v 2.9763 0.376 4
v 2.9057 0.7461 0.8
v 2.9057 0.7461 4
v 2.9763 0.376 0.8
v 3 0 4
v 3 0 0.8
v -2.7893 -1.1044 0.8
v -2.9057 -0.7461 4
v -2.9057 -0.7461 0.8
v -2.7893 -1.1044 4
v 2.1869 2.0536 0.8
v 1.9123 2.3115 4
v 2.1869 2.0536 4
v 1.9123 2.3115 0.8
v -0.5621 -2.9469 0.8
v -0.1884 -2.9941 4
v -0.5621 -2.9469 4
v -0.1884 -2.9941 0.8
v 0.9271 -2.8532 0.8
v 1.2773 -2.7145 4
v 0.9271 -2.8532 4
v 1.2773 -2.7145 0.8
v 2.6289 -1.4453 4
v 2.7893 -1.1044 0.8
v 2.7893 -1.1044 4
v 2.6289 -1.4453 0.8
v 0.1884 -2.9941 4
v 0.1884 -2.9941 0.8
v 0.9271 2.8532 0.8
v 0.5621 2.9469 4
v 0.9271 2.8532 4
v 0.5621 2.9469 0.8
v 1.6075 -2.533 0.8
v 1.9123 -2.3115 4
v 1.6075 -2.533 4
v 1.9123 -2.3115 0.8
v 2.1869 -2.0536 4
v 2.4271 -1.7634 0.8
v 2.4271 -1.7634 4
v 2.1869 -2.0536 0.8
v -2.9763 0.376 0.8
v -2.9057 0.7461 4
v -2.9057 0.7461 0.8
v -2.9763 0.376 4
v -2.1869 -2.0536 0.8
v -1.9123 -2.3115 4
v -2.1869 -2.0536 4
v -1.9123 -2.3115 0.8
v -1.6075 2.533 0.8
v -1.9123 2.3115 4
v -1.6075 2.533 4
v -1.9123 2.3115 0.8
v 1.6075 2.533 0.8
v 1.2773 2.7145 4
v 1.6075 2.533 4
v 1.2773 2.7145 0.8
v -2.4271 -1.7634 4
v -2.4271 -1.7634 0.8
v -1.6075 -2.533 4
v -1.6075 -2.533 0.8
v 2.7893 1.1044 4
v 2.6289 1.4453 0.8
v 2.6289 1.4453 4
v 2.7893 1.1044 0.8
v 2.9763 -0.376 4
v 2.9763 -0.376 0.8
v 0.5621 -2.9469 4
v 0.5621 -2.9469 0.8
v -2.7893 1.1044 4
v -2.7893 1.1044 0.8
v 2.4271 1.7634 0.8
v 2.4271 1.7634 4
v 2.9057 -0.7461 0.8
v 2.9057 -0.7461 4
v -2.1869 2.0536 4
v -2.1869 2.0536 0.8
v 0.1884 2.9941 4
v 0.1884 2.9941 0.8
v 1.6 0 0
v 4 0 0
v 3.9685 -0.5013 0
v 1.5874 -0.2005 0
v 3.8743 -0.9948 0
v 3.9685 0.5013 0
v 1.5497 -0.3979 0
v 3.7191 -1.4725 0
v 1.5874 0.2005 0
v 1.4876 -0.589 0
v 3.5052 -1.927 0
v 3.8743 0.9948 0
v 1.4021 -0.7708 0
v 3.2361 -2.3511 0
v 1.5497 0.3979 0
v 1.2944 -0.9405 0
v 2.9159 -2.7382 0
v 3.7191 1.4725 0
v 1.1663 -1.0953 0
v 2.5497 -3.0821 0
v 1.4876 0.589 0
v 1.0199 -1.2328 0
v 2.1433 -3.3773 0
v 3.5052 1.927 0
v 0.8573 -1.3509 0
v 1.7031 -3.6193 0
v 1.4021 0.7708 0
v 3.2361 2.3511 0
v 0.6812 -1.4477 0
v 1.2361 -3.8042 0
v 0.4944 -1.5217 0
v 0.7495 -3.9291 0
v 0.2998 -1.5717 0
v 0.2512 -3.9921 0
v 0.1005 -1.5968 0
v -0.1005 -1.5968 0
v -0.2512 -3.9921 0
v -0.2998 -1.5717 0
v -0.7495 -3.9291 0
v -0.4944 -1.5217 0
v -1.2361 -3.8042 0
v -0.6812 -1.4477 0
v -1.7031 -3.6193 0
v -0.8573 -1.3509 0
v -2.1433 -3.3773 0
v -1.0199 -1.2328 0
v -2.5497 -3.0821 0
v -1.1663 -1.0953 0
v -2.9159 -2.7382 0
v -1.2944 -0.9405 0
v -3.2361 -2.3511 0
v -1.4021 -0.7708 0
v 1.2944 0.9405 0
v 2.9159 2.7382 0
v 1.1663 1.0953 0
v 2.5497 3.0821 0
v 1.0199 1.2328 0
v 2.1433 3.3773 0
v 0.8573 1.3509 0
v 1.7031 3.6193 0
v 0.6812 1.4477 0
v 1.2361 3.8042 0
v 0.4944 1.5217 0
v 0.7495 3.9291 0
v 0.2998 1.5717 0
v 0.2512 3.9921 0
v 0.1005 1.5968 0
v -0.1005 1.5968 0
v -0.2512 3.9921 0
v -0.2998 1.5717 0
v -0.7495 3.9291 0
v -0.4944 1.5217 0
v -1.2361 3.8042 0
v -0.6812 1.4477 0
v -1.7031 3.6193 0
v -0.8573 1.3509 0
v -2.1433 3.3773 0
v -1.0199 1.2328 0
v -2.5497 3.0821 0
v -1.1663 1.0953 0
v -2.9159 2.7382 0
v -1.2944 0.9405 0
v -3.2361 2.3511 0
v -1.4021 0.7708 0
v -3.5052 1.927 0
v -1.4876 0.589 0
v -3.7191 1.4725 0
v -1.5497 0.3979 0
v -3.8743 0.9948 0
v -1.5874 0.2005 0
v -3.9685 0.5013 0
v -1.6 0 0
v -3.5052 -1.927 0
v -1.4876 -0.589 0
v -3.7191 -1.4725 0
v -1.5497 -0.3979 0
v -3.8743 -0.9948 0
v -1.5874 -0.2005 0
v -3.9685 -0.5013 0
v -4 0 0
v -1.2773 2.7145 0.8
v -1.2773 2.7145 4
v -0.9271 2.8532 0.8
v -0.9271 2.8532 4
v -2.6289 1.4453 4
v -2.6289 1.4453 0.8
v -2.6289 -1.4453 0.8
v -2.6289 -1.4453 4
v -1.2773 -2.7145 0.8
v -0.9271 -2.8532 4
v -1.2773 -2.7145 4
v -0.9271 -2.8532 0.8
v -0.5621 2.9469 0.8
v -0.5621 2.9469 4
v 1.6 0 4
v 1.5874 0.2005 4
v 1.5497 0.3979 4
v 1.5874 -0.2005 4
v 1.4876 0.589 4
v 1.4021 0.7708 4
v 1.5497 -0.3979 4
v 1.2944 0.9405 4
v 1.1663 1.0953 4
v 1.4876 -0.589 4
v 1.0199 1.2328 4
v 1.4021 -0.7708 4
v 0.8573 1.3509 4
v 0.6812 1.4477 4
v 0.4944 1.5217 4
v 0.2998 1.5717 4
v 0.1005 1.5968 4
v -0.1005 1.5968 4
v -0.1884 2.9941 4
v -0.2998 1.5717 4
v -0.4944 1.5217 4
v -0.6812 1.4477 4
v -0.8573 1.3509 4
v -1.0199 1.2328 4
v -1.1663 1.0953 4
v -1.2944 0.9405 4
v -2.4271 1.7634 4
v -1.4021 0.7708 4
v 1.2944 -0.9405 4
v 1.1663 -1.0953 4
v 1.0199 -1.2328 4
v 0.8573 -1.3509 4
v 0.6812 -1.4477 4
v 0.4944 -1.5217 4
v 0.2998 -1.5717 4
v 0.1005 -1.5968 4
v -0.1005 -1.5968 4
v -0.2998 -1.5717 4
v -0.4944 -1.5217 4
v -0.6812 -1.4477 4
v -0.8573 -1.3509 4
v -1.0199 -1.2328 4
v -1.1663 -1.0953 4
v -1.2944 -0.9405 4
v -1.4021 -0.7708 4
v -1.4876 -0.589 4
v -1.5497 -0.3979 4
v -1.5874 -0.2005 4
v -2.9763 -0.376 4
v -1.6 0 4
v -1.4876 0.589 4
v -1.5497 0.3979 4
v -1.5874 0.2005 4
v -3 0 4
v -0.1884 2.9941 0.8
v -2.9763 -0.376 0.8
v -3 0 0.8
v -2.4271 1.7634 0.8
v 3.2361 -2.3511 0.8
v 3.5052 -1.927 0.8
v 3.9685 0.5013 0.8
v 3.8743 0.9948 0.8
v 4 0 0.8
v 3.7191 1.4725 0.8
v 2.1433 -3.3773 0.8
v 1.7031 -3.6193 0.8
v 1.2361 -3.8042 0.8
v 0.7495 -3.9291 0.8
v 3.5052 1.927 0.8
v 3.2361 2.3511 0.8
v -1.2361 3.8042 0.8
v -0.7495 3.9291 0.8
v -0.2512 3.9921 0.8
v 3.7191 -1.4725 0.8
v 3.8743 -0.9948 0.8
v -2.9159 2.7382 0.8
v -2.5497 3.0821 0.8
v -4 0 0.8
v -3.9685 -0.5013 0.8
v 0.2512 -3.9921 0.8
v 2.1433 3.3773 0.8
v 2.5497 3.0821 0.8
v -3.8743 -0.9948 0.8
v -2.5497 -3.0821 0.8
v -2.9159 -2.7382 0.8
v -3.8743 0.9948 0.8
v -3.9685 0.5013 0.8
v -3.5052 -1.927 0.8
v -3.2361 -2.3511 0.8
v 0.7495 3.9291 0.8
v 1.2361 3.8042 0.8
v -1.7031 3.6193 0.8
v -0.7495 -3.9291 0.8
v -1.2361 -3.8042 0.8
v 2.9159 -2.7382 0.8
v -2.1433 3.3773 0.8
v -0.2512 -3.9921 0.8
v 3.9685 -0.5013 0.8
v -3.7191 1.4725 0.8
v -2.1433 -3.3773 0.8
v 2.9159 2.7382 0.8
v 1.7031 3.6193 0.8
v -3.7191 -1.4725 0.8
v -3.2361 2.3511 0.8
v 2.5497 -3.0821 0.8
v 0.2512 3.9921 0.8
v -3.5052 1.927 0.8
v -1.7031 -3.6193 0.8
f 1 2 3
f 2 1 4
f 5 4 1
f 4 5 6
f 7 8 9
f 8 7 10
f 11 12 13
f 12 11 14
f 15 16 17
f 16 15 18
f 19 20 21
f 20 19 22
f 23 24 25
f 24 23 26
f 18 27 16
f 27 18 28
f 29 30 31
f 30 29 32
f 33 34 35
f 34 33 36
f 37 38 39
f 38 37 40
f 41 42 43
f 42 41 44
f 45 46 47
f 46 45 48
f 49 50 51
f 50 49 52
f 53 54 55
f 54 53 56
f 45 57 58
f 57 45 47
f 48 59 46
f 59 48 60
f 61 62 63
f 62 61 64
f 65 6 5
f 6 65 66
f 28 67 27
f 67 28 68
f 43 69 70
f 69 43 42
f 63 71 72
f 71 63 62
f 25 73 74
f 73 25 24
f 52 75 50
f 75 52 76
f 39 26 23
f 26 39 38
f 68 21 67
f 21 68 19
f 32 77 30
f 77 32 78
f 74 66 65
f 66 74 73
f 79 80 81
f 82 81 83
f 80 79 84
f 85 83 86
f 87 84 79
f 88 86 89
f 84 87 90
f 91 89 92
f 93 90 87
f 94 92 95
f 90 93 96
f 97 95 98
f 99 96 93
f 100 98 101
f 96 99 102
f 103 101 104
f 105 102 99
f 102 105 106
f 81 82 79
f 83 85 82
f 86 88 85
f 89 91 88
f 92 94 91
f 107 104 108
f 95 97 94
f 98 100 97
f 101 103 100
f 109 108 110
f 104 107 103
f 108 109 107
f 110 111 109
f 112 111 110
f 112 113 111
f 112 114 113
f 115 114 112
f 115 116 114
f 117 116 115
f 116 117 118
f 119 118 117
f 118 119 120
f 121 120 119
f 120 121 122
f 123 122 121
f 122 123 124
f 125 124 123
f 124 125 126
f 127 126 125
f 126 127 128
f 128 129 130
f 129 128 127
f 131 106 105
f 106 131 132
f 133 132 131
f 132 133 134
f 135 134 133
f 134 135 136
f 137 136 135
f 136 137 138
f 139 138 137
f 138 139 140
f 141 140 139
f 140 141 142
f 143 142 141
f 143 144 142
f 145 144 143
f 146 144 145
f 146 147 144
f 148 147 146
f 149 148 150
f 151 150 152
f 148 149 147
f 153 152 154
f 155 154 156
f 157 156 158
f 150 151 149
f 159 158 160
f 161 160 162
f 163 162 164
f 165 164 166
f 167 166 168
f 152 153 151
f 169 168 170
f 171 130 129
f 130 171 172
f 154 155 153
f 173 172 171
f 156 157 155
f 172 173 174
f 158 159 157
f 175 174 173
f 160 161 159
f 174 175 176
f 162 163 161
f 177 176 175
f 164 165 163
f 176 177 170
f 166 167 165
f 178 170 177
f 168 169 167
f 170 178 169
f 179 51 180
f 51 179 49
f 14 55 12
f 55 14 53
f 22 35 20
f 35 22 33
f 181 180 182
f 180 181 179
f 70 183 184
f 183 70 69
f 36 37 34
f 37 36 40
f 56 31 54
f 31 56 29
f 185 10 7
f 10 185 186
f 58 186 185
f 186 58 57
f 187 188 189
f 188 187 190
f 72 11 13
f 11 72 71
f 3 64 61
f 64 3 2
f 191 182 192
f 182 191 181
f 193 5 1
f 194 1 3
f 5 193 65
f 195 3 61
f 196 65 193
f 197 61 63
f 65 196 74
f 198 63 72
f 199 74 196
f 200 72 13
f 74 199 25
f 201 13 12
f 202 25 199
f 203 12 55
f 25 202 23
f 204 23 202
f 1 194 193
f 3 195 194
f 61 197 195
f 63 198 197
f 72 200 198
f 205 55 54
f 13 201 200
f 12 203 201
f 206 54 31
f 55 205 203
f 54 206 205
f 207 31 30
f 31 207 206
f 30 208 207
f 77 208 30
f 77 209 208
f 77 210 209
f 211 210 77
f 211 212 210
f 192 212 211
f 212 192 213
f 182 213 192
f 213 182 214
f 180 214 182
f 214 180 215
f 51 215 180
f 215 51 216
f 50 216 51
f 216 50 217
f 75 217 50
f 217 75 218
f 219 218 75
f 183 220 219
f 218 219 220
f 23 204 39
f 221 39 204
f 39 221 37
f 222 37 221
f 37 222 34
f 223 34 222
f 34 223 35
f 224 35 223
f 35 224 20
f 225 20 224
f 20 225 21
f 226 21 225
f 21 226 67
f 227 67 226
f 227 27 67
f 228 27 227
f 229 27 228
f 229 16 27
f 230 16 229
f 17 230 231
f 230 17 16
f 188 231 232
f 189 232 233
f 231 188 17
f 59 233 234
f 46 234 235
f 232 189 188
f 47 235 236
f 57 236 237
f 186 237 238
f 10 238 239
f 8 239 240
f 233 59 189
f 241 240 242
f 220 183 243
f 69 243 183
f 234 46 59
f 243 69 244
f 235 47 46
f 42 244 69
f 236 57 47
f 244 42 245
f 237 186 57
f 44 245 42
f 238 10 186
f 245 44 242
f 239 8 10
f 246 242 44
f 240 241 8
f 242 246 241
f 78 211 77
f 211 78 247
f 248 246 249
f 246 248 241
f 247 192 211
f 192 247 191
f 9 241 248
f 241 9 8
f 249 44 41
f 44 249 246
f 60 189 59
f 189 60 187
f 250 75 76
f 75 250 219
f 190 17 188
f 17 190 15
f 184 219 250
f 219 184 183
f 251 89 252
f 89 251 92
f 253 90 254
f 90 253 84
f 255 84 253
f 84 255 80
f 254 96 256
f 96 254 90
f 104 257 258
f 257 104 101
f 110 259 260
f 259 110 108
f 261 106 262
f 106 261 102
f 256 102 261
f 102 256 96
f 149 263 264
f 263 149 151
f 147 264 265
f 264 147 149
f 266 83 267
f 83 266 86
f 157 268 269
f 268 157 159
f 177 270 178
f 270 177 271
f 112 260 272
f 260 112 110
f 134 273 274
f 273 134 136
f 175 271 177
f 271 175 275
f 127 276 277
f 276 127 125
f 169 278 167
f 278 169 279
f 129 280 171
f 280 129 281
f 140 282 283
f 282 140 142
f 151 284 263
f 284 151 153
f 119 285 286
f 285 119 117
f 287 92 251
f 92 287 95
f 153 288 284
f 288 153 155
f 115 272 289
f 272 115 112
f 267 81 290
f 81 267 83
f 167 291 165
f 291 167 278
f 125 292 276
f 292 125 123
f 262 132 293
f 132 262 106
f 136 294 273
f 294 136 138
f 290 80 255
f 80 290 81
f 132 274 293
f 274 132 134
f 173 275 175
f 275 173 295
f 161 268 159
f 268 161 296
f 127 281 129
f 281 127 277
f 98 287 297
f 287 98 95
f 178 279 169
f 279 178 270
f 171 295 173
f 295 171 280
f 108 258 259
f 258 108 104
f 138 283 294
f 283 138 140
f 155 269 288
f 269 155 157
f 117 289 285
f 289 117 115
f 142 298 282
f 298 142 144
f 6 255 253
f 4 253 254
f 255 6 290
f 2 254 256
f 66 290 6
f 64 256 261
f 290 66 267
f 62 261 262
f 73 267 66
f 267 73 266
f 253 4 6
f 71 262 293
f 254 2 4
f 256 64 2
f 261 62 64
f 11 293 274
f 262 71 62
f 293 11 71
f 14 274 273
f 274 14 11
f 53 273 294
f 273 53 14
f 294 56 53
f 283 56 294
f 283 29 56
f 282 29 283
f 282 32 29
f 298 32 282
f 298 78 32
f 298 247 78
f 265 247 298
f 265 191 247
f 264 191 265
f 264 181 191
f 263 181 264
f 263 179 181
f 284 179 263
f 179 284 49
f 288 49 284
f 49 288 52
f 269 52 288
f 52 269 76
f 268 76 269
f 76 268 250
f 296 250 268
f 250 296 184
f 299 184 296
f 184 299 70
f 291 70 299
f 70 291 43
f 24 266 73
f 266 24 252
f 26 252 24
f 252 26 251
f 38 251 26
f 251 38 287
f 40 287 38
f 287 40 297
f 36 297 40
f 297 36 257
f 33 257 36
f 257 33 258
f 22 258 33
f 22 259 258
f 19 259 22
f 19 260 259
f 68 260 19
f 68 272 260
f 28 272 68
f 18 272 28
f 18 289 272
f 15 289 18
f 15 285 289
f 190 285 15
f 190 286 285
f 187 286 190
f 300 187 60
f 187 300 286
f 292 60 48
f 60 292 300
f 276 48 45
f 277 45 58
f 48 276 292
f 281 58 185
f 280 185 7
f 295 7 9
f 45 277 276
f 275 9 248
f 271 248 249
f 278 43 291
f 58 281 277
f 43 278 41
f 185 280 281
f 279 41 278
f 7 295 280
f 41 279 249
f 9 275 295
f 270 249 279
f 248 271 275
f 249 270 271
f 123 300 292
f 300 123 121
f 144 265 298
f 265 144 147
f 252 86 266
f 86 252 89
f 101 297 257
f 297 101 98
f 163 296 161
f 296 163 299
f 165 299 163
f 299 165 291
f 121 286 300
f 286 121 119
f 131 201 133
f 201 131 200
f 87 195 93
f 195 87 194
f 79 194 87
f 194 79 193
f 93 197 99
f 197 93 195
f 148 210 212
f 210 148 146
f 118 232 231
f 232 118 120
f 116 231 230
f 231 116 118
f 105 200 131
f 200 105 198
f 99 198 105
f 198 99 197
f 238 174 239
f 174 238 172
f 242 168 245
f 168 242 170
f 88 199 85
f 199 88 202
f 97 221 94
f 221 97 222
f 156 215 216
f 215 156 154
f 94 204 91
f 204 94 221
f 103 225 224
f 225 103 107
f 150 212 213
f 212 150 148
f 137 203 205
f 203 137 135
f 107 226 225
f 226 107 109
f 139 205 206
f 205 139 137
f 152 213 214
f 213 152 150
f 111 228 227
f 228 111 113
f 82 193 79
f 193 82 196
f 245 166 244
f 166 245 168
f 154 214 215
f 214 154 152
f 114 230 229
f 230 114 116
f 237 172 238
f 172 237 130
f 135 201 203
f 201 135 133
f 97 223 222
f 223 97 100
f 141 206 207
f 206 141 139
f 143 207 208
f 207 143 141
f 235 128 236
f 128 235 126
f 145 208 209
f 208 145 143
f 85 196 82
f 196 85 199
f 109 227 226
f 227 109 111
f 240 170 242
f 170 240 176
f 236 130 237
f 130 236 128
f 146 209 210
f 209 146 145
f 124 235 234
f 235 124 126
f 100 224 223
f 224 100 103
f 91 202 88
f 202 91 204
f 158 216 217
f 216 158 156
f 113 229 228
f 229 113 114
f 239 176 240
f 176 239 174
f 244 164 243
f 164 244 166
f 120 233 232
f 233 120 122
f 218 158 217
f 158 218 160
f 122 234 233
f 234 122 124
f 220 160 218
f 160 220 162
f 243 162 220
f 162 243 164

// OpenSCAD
spring_diameter = 8;
spring_wire_diameter = 1;
screw_diameter = 3.2;
bottom_thickness = 2 * 0.4;
bushing_height = 4;
bushing_inner_diameter = spring_diameter - 2 * spring_wire_diameter;
bushing_outer_diameter = spring_diameter;
$fn = 50;

main();

module main() {
    difference() {
        base();

        screwHole();
    }
}

module base() {
    union() {
        cylinder(h = bushing_height, d = bushing_inner_diameter);
        cylinder(h = bottom_thickness, d = bushing_outer_diameter);
    }
}

module screwHole() {
    cylinder(h = 4 * bushing_height, d = screw_diameter, center = true);
}
